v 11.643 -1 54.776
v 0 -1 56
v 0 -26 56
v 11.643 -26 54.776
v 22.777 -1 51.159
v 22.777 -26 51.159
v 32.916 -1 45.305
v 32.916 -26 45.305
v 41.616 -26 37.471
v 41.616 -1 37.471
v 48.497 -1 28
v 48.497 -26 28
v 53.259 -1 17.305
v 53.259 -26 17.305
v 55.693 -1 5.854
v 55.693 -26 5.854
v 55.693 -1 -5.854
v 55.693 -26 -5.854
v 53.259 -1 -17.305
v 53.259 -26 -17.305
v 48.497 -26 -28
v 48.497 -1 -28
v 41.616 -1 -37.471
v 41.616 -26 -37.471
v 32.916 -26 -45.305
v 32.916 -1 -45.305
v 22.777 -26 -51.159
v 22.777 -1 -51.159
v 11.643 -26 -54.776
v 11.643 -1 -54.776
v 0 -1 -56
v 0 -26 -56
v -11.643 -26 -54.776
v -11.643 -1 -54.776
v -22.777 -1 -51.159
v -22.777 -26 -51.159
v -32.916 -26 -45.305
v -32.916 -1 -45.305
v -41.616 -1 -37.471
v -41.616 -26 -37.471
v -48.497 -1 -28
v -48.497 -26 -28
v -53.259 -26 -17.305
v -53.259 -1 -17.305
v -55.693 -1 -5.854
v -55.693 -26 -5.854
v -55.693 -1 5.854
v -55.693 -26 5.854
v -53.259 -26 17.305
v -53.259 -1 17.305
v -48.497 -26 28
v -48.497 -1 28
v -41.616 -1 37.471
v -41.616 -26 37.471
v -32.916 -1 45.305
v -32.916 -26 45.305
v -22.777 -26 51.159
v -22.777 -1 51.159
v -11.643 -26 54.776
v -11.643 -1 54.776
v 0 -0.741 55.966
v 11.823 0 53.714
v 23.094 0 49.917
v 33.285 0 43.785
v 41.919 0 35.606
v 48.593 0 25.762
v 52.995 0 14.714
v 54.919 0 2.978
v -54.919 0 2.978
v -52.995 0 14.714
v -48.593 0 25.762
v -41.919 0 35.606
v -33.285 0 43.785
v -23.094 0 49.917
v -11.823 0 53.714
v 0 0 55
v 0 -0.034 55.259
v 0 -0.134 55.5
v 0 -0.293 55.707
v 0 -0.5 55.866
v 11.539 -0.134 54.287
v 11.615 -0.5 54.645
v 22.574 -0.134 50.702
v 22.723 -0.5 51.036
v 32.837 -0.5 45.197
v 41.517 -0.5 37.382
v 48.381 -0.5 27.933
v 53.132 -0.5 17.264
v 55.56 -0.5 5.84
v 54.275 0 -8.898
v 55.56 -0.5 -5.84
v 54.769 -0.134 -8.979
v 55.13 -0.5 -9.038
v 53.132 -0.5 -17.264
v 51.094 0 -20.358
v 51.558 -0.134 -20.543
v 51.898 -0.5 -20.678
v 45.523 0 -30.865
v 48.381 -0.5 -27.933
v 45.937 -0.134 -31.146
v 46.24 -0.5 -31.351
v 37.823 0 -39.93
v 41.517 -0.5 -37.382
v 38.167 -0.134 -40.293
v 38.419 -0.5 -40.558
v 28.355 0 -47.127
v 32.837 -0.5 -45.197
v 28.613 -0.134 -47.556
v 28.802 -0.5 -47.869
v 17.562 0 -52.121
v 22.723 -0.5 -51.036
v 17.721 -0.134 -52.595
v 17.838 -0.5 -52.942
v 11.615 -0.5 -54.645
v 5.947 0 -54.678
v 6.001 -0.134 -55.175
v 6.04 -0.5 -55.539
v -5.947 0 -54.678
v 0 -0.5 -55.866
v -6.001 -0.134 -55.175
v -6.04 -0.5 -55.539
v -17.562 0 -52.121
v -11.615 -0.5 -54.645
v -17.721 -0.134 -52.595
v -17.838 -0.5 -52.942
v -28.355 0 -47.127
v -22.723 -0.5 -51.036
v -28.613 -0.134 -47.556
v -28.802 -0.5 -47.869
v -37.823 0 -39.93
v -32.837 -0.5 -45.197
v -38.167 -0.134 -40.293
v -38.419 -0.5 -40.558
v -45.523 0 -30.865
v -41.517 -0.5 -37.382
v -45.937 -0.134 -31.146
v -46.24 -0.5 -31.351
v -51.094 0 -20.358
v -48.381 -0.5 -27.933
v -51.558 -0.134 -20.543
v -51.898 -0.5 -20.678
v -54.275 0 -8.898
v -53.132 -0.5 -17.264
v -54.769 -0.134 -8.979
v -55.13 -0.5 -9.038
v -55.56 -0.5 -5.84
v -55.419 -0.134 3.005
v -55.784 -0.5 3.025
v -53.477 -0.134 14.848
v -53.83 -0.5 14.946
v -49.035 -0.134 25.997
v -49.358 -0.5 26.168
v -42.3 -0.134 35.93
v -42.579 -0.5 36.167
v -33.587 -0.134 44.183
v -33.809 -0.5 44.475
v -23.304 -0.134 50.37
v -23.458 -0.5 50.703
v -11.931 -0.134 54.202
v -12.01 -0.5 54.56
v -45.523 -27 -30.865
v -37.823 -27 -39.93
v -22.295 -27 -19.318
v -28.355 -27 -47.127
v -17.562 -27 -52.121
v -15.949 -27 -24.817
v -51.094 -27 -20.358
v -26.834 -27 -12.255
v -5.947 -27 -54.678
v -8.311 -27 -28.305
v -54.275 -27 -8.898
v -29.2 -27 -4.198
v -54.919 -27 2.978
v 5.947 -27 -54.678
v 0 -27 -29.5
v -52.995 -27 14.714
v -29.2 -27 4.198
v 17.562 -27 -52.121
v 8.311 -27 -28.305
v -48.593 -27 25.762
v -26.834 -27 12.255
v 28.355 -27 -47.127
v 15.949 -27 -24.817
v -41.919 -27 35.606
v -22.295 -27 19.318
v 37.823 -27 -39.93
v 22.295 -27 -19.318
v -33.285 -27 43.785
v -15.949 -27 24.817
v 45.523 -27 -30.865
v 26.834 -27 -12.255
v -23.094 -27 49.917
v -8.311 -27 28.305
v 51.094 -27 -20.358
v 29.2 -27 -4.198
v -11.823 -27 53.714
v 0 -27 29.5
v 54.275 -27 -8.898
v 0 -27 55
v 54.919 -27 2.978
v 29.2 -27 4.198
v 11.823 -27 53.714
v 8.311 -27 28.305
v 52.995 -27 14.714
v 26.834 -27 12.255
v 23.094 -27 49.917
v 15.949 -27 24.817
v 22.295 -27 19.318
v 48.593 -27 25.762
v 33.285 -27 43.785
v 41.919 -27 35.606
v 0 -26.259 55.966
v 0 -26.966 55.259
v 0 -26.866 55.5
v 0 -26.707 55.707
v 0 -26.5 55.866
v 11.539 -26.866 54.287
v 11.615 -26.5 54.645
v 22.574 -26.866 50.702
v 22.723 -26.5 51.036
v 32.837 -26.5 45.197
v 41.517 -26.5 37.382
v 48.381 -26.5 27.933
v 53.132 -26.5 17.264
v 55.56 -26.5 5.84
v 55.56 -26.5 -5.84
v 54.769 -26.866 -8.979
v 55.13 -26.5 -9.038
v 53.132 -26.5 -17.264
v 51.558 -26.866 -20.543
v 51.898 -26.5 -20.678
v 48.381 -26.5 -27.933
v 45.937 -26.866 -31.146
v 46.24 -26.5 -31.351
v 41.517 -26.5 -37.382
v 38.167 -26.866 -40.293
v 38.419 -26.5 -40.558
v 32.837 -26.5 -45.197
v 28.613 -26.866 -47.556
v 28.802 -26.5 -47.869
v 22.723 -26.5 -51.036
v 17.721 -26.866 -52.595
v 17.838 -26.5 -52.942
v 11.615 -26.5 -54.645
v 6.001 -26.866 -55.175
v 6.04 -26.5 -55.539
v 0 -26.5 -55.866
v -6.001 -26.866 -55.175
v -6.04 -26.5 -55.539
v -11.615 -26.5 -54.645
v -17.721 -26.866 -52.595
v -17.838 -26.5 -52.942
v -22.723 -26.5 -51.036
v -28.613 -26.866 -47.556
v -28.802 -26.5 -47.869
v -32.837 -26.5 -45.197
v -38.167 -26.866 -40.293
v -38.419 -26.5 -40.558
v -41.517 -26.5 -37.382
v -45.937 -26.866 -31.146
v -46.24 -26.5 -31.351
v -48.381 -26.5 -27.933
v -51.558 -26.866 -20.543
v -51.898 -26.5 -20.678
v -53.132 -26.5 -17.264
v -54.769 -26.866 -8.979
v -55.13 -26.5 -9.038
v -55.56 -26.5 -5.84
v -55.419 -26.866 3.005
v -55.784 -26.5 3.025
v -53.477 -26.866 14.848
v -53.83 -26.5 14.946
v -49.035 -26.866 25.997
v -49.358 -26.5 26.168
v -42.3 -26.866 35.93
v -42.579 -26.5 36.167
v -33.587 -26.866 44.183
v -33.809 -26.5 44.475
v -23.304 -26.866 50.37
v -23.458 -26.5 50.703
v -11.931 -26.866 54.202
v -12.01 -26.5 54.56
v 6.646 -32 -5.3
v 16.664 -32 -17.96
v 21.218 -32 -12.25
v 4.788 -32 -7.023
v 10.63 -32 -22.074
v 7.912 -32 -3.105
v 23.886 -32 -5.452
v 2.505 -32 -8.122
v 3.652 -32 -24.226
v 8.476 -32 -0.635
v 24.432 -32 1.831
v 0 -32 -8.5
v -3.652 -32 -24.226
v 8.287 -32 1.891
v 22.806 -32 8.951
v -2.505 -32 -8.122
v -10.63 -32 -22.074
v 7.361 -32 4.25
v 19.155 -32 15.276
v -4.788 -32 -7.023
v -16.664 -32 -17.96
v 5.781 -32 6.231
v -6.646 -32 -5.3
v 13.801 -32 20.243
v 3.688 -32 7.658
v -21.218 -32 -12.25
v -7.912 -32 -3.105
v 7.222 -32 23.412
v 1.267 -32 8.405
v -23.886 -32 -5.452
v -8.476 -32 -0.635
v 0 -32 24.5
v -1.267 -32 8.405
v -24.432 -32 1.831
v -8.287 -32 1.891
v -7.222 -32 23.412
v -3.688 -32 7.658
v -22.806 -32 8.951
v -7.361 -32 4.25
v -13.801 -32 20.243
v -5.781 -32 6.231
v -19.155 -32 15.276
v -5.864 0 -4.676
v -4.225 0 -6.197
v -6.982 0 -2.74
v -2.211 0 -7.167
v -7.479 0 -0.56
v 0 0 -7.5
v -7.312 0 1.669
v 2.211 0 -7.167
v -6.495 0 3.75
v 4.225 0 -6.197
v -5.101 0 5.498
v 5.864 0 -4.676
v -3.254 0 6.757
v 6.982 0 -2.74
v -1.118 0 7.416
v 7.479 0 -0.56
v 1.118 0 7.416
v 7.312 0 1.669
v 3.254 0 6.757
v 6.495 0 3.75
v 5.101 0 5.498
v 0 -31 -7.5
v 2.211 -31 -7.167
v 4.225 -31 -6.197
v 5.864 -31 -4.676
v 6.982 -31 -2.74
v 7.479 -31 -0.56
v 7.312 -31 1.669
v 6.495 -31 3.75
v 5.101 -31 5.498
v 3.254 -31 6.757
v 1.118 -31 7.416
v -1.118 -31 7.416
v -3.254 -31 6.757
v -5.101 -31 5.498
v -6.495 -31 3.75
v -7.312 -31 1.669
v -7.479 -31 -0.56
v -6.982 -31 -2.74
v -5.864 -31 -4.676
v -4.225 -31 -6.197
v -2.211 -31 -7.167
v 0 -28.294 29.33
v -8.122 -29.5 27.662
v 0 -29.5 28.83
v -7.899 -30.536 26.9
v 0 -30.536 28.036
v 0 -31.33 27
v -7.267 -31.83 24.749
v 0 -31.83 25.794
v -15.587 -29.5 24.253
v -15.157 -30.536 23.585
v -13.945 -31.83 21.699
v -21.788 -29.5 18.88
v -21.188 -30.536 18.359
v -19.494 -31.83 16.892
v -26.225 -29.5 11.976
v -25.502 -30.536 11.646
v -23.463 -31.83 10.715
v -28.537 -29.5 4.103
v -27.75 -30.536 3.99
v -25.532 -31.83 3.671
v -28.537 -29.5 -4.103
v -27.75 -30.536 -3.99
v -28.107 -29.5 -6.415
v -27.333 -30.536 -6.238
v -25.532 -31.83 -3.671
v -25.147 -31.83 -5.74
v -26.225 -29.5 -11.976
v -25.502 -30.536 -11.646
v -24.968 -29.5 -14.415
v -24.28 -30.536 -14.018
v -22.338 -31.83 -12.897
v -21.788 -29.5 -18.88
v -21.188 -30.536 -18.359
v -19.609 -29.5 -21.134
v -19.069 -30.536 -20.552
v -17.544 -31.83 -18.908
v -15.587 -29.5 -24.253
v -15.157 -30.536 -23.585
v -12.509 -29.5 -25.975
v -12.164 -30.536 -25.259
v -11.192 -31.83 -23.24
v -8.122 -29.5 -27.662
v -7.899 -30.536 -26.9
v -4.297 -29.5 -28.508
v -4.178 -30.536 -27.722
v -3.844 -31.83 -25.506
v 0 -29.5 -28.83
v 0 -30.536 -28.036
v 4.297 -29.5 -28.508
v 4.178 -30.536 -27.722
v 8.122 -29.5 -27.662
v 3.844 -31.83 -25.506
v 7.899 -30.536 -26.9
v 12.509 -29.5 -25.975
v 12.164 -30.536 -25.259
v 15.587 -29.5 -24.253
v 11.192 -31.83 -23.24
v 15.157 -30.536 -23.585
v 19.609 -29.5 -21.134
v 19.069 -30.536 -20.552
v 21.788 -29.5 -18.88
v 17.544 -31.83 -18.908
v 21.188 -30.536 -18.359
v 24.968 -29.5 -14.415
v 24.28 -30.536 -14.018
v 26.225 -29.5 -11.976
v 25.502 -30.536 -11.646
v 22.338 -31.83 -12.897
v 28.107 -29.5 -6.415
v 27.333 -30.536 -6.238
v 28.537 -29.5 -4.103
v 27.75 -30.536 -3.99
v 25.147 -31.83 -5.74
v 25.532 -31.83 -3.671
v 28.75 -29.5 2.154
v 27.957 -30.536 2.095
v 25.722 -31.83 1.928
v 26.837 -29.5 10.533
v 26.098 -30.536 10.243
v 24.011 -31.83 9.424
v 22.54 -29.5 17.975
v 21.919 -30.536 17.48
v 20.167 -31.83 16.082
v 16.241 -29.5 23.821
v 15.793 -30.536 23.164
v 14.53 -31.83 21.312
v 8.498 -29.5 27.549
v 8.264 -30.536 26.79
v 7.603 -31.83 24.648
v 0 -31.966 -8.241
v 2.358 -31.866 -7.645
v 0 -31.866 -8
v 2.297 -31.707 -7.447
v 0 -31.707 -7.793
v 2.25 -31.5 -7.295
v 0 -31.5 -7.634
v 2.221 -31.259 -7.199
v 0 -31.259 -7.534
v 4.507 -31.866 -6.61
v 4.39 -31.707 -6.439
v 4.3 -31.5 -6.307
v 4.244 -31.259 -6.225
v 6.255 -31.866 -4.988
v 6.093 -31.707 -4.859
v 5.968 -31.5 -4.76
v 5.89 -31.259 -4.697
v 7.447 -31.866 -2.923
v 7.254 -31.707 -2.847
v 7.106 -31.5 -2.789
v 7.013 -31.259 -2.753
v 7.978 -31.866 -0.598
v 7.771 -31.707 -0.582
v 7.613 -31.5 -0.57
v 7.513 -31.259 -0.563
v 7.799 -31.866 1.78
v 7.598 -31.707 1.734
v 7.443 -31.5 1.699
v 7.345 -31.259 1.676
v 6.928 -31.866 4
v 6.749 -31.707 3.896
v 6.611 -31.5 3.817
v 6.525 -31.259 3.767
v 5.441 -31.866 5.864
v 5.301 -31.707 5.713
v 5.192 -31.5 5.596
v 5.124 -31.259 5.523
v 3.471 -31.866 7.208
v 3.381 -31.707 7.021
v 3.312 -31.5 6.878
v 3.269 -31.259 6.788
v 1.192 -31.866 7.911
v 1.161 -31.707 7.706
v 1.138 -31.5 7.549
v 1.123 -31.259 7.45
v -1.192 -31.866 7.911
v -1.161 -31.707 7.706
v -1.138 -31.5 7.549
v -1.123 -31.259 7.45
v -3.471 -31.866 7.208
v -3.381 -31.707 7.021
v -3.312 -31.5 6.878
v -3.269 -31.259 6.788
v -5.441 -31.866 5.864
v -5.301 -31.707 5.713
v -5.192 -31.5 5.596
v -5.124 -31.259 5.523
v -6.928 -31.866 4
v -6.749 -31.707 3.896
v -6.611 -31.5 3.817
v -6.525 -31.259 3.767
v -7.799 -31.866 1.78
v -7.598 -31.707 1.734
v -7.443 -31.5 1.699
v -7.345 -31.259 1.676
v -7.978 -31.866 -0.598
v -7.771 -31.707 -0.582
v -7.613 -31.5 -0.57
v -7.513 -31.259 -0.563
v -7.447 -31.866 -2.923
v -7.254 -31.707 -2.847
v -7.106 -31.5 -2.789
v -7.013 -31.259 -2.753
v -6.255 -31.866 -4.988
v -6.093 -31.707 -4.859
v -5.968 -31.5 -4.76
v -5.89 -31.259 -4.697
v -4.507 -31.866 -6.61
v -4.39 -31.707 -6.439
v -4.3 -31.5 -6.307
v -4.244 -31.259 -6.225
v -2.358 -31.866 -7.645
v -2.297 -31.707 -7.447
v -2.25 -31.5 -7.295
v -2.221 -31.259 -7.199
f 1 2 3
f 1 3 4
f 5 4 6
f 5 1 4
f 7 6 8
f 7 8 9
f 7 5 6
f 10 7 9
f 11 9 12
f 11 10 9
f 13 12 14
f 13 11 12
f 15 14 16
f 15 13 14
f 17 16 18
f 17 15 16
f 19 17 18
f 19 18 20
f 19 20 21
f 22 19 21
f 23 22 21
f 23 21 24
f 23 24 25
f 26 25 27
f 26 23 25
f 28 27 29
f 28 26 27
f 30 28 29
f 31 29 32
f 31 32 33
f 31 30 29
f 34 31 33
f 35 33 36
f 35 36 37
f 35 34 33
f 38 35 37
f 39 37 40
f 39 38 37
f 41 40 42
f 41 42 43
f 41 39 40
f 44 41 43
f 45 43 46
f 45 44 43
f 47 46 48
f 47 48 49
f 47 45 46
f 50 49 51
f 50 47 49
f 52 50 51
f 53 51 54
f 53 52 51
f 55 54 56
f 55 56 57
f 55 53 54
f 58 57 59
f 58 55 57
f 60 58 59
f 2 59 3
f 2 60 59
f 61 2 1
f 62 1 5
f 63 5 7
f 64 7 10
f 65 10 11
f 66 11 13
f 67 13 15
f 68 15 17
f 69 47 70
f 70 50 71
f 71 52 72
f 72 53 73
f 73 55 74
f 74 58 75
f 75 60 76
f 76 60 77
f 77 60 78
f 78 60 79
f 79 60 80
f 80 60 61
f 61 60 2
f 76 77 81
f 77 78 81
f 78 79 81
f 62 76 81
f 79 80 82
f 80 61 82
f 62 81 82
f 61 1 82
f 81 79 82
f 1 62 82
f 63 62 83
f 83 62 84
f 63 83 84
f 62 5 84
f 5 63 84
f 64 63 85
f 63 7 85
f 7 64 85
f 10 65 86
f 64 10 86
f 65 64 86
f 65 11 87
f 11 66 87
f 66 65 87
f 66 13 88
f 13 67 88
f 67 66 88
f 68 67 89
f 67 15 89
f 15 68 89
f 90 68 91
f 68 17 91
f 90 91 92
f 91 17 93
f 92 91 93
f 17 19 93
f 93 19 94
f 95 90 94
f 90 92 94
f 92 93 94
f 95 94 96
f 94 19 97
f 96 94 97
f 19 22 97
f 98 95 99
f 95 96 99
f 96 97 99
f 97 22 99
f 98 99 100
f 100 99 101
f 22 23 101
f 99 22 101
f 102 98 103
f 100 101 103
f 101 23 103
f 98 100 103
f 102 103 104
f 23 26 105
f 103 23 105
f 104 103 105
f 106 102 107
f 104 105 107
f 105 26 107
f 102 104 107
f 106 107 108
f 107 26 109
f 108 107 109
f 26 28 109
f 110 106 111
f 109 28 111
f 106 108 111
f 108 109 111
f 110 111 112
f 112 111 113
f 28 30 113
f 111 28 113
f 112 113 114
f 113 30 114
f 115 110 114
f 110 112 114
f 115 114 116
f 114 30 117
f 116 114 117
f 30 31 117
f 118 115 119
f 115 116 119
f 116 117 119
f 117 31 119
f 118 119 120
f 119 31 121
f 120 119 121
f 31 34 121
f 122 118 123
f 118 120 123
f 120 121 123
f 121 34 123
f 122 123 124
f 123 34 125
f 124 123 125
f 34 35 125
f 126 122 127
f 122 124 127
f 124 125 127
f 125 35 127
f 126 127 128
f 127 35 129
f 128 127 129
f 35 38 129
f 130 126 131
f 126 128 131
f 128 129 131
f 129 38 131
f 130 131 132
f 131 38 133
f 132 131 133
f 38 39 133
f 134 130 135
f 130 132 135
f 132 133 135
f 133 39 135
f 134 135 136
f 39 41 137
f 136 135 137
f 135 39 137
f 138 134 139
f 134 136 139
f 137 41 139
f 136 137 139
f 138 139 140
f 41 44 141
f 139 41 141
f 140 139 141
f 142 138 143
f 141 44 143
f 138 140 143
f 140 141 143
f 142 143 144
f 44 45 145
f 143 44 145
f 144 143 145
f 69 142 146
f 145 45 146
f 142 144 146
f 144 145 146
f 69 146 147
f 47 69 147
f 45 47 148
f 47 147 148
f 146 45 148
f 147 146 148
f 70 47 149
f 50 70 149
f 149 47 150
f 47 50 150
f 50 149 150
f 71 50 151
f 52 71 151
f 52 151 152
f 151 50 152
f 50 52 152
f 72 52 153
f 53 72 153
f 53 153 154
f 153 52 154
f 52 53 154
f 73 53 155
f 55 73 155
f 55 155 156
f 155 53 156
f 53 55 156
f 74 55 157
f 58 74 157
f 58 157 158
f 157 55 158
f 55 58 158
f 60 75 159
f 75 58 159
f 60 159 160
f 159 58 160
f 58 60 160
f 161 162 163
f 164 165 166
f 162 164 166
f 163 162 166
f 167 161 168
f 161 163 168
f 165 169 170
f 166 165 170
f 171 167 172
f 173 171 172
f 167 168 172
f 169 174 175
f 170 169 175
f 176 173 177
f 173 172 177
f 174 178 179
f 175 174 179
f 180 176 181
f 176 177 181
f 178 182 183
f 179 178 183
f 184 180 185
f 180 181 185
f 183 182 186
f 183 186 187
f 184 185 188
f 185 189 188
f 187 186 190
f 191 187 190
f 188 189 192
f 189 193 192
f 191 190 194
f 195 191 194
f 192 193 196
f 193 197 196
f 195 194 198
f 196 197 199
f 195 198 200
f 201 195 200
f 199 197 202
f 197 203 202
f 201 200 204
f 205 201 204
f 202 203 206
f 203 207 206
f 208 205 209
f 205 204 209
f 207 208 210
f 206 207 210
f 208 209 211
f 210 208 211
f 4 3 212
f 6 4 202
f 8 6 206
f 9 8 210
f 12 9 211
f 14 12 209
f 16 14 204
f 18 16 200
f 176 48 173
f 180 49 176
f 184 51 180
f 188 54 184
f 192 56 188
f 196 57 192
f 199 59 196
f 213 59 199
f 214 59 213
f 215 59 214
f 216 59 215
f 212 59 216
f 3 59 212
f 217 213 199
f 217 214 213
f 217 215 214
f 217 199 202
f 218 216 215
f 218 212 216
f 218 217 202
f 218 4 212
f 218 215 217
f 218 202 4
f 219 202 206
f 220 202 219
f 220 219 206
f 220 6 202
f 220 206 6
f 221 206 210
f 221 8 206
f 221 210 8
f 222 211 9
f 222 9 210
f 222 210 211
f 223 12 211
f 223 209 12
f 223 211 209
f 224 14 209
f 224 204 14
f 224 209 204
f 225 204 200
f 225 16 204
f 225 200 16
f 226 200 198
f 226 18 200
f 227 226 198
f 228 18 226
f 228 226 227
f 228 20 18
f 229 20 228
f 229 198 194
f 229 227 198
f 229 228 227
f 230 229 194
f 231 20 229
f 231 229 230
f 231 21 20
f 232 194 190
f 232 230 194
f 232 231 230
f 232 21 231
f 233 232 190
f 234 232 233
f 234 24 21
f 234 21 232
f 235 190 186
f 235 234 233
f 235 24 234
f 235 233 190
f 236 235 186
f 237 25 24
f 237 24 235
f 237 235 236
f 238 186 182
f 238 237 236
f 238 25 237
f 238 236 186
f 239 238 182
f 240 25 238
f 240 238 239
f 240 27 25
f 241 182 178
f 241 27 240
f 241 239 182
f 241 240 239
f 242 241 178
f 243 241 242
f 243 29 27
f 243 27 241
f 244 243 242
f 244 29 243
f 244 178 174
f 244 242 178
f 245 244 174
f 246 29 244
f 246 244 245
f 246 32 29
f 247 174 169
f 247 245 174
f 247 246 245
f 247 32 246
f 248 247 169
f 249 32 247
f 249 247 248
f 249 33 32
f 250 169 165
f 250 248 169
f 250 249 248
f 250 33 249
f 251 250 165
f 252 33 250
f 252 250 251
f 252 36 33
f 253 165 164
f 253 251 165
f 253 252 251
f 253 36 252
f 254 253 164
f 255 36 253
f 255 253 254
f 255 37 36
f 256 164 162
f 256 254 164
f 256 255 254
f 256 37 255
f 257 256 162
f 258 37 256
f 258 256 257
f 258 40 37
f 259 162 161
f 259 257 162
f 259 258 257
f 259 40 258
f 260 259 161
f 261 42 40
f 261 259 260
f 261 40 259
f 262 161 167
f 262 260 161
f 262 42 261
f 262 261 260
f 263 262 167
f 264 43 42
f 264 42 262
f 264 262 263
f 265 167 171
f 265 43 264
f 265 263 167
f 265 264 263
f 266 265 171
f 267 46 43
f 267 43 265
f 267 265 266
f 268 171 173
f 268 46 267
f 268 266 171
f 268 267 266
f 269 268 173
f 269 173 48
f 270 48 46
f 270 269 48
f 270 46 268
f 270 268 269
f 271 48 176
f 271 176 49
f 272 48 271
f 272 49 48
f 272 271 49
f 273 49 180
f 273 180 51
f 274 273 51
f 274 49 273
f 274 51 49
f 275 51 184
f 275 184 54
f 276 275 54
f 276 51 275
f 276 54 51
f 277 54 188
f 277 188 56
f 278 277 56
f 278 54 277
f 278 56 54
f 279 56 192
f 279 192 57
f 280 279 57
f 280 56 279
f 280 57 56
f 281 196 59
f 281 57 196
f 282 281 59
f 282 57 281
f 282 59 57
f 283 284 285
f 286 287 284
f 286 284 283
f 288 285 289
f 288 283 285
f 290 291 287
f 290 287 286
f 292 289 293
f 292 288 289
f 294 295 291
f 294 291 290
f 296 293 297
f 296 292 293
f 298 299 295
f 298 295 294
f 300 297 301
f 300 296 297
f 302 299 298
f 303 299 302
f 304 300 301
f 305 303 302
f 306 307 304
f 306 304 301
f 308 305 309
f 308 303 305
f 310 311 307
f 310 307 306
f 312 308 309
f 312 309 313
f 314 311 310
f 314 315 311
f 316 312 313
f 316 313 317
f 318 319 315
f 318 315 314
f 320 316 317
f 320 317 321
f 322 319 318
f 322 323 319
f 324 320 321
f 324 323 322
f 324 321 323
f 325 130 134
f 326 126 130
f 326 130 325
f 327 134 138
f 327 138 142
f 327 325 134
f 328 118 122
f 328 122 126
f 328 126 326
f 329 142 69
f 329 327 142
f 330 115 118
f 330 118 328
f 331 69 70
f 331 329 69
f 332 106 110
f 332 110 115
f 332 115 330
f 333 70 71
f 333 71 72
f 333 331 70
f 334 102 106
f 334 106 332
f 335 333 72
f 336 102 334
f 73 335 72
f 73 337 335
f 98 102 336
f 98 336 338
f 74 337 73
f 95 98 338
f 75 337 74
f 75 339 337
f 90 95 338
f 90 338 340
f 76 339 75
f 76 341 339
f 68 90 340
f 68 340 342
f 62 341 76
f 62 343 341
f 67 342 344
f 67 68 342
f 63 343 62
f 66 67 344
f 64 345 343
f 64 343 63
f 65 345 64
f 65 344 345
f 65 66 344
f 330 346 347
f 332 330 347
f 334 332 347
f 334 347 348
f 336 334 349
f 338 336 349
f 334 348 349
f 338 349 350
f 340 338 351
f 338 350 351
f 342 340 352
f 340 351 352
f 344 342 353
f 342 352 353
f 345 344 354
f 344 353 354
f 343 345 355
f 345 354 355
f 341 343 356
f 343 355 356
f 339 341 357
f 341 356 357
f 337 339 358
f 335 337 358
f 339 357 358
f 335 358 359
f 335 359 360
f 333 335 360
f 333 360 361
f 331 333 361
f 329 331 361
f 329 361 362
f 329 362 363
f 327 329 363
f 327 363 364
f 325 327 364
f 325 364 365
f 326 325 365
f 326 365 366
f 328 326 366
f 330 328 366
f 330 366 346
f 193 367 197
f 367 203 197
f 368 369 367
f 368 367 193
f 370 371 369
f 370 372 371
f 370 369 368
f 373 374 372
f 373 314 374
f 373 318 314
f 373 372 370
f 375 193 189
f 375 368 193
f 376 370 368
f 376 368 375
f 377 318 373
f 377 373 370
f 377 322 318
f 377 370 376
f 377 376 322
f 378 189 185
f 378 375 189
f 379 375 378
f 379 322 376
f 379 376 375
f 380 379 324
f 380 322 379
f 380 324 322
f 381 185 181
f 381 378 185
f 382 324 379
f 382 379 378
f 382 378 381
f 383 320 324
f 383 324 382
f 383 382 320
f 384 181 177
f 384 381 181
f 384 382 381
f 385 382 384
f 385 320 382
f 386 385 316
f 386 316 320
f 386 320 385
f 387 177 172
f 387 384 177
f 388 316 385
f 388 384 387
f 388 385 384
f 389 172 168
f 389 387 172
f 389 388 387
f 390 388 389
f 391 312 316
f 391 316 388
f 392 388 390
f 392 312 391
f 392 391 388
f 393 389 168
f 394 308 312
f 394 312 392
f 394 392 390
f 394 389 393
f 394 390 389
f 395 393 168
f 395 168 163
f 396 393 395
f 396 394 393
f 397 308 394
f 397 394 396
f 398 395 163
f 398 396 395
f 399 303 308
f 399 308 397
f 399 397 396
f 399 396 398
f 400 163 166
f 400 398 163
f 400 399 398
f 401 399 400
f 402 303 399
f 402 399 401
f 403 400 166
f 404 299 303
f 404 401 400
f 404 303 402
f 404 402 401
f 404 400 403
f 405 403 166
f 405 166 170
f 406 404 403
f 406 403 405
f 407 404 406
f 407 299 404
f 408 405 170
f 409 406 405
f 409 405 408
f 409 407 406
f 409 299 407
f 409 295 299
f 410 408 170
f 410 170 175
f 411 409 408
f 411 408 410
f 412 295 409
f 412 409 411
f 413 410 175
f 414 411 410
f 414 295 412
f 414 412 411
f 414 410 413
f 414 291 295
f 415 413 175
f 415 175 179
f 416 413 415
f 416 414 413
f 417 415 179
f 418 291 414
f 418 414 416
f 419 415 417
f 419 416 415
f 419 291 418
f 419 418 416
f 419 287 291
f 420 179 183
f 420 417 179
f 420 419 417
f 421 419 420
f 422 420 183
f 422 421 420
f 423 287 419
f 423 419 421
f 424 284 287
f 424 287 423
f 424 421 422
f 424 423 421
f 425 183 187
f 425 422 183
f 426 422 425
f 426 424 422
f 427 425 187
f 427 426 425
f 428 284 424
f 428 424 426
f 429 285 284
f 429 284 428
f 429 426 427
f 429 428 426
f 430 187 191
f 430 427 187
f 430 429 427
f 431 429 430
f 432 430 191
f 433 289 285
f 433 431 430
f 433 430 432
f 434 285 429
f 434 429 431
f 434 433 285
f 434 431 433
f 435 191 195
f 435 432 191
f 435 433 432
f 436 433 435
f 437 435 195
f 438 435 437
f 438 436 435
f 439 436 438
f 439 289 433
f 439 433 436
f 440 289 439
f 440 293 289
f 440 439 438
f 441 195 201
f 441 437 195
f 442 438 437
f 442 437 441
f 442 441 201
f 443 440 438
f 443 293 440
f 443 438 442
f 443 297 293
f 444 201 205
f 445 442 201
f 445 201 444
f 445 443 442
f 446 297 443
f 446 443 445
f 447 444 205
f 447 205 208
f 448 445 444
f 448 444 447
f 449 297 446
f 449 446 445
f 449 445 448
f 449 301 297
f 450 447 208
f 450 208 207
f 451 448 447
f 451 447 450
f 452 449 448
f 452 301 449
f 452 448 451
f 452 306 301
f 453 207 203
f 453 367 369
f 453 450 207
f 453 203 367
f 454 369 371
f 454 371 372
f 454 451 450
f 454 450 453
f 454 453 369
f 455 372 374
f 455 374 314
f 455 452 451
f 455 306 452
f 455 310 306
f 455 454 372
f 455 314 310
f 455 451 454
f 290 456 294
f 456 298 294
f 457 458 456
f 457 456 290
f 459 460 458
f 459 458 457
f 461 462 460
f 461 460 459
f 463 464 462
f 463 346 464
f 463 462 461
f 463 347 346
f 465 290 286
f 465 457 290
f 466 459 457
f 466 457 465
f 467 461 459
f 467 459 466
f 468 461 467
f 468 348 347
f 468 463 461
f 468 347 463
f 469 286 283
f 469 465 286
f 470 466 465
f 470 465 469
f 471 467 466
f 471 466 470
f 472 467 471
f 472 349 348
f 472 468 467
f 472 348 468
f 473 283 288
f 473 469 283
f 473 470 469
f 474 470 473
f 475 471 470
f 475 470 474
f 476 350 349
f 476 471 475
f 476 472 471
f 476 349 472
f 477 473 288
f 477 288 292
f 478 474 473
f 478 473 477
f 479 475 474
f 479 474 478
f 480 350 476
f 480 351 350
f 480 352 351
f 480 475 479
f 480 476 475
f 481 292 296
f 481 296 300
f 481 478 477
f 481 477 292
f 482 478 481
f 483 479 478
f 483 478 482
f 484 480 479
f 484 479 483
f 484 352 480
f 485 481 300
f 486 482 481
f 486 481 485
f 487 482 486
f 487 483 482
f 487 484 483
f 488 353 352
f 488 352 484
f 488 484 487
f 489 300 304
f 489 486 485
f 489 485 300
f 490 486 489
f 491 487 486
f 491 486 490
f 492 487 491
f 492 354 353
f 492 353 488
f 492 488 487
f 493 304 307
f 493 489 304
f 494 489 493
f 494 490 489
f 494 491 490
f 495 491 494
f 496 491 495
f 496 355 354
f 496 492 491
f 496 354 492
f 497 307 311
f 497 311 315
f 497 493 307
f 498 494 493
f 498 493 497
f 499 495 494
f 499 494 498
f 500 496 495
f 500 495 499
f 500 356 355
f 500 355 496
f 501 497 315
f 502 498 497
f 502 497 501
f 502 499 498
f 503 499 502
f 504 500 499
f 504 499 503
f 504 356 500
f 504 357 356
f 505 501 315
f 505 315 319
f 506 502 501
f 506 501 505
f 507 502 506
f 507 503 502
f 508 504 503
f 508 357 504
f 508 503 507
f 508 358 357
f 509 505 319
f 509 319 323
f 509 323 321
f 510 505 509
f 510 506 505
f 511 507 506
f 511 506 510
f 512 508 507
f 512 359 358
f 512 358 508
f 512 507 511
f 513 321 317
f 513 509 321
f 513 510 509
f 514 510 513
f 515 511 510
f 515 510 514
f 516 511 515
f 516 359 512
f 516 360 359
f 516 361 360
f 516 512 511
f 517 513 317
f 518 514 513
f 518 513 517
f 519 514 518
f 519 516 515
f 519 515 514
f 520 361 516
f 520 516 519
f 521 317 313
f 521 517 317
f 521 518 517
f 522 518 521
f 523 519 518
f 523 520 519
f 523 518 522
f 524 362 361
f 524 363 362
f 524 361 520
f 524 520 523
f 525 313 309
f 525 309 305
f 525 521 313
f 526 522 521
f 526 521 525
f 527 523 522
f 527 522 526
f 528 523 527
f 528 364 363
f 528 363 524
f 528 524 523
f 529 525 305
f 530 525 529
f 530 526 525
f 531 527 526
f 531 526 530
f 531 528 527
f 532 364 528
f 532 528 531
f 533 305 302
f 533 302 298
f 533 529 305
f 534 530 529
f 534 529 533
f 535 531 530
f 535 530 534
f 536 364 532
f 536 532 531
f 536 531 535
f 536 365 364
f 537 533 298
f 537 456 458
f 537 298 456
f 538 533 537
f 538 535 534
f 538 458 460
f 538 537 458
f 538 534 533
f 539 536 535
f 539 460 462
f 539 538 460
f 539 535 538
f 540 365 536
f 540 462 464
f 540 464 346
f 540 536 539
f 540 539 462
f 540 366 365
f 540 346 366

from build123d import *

# Parameters (mm, degrees)
SKETCH_1_R          = 56
EXTRUDE_1_DEPTH     = 27
SKETCH_3_R          = 29.5
EXTRUDE_2_DEPTH     = 5
FILLET_1_R          = 5
SKETCH_6_R          = 7.5
CUT_EXTRUDE_1_DEPTH = 33
FILLET_2_R          = 1
FILLET_3_R          = 1


with BuildPart() as part:
    # Эскиз1 → Бобышка-Вытянуть1 (new body)
    with BuildSketch(Plane(origin=(0, 0, 0), x_dir=(1, 0, 0), z_dir=(0, 1, 0))):
        with Locations(Location((0, 0, 0), (0, 0, 270))):
            Circle(SKETCH_1_R)
    extrude(amount=-EXTRUDE_1_DEPTH)

    # Эскиз3 → Бобышка-Вытянуть2 (add)
    with BuildSketch(Plane(origin=(0, -27, 0), x_dir=(-1, 0, 0), z_dir=(0, -1, 0))):
        with Locations(Location((0, 0, 0), (0, 0, 270))):
            Circle(SKETCH_3_R)
    extrude(amount=EXTRUDE_2_DEPTH)

    # Скругление1
    fillet_1_edges = [part.edges().sort_by_distance(p)[0] for p in [
        (0, -32, -29.5),
    ]]
    fillet(fillet_1_edges, radius=FILLET_1_R - 0.0001)  # a hair under: the kernel refuses the full size

    # Эскиз6 → Вырез-Вытянуть1 (cut)
    with BuildSketch(Plane.XZ.offset(32)):
        with Locations(Location((0, 0, 0), (0, 0, 270))):
            Circle(SKETCH_6_R)
    extrude(amount=-CUT_EXTRUDE_1_DEPTH, mode=Mode.SUBTRACT)

    # Скругление2
    fillet_2_edges = [part.edges().sort_by_distance(p)[0] for p in [
        (0, -32, 7.5),
    ]]
    fillet(fillet_2_edges, radius=FILLET_2_R)

    # Скругление3
    fillet_3_edges = [part.edges().sort_by_distance(p)[0] for p in [
        (0, 0, -56),
        (0, -27, -56),
    ]]
    fillet(fillet_3_edges, radius=FILLET_3_R)


solid = part.part
